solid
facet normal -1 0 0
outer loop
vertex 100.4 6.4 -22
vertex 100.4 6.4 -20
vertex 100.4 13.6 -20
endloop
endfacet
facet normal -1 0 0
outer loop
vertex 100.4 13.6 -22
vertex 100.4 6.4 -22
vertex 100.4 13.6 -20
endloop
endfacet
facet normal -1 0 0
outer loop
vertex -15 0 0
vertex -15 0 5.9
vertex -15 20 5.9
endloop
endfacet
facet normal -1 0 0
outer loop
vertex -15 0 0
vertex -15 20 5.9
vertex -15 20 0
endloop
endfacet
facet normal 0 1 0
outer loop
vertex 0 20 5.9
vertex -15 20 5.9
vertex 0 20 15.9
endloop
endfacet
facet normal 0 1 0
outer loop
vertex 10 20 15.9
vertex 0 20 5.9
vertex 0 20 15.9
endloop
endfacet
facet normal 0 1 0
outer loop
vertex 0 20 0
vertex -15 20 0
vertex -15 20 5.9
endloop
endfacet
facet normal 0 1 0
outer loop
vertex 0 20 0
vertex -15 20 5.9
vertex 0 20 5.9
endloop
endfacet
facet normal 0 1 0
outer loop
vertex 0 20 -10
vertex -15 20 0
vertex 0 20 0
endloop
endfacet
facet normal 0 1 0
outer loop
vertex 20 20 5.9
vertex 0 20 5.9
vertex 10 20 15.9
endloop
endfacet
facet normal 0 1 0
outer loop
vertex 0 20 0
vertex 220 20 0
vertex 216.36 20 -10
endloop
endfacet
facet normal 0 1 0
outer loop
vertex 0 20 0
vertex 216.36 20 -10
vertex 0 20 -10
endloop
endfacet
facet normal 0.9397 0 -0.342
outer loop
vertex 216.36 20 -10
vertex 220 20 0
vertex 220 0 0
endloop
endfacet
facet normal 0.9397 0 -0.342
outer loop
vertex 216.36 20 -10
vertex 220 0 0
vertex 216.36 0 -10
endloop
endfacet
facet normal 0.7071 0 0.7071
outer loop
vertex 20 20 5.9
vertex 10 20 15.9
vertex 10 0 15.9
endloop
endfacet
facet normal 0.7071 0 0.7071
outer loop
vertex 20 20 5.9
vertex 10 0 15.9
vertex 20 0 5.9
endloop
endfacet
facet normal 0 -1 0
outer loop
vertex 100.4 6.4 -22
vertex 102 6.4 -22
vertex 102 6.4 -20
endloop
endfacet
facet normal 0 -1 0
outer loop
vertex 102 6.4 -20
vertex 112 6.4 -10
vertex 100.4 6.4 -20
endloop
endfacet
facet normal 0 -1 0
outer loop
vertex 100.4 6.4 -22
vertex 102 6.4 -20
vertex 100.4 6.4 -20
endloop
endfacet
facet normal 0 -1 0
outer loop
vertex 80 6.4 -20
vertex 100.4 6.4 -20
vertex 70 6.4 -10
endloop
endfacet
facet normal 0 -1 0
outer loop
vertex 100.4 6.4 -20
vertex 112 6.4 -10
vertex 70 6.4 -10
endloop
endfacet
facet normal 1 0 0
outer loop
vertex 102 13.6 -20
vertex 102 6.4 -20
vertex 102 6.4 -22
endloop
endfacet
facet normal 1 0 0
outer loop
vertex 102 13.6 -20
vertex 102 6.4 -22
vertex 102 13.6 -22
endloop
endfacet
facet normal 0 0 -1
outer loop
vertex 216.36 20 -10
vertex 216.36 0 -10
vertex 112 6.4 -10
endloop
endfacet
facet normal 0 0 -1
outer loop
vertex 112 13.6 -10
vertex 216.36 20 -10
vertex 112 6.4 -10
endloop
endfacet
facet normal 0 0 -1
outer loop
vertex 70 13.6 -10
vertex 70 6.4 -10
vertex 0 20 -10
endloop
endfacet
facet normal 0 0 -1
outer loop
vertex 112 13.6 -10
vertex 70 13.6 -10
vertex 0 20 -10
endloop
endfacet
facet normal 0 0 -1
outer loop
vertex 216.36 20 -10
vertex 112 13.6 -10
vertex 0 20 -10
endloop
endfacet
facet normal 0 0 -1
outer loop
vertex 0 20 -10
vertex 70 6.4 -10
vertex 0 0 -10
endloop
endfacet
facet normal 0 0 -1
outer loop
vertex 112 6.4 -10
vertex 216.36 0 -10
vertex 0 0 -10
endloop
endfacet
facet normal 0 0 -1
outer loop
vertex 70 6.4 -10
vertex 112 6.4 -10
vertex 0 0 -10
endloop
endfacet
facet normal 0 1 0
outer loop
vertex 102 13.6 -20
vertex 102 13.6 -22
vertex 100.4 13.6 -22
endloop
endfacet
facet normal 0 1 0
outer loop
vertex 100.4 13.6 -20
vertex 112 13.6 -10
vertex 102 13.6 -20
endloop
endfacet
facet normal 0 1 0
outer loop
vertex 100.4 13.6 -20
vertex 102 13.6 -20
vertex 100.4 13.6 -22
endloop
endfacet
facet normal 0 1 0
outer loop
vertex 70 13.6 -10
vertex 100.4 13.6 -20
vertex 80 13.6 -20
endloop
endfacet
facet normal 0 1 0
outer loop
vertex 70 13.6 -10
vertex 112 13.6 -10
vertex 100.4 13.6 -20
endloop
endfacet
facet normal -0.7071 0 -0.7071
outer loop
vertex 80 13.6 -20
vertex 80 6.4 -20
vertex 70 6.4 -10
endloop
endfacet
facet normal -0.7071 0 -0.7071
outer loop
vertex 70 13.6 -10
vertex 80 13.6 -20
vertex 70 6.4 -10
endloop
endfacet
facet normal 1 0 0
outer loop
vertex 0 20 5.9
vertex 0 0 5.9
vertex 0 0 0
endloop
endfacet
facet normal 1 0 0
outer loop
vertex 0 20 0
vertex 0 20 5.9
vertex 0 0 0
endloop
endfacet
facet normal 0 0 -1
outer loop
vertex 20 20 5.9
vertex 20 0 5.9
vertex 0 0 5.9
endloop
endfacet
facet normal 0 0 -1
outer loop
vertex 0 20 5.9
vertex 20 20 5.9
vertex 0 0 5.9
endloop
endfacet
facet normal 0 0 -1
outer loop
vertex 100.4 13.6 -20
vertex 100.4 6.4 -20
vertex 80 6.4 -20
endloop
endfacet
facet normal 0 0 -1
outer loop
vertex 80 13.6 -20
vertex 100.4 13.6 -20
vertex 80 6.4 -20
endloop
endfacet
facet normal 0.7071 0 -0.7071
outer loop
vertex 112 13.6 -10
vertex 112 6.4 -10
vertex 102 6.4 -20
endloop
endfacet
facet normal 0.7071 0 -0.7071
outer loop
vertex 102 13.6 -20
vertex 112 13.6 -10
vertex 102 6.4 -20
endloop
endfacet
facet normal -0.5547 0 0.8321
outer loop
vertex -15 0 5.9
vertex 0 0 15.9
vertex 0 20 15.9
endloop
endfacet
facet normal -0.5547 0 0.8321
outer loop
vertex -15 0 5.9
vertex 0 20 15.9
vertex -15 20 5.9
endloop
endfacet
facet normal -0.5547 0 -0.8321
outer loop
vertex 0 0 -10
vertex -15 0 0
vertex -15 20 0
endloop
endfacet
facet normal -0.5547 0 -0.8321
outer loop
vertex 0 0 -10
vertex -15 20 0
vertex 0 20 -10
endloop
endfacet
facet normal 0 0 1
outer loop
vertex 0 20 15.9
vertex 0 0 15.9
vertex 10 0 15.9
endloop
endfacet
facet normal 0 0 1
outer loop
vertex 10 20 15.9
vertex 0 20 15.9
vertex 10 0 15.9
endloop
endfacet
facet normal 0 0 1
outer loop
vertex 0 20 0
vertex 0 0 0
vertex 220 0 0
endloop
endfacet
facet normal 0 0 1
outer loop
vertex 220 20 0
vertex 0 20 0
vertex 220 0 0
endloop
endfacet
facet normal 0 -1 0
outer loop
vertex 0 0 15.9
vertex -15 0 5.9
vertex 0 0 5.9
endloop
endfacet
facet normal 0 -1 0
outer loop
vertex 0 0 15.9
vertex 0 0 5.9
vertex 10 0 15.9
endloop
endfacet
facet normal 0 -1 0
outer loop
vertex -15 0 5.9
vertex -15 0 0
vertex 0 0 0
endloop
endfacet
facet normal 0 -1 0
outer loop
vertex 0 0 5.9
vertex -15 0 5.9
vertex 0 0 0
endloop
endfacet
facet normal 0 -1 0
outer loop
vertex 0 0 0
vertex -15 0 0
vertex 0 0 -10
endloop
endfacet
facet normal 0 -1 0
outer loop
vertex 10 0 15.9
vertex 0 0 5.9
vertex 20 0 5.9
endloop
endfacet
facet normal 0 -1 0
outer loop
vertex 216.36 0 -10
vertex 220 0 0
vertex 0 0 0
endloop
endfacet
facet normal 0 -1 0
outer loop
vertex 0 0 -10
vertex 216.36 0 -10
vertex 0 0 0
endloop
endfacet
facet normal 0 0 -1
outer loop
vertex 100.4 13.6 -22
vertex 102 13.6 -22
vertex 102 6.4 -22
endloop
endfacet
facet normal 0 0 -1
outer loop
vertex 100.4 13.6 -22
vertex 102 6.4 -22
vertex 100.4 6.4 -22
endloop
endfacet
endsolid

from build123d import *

# Parameters (mm, degrees)
SKIZZE1_W                       = 15
SKIZZE1_H                       = 5.9
AUFSATZ_LINEAR_AUSTRAGEN1_DEPTH = 20
SCHNITT_LINEAR_AUSTRAGEN1_DEPTH = 6.4
SCHNITT_LINEAR_AUSTRAGEN2_DEPTH = 6.4
SKIZZE4_W                       = 1.6
SKIZZE4_H                       = 7.2
AUFSATZ_LINEAR_AUSTRAGEN2_DEPTH = 2


with BuildPart() as part:
    # Skizze1 → Aufsatz-Linear austragen1 (new body)
    with BuildSketch(Plane(origin=(0, 0, 0), x_dir=(1, 0, 0), z_dir=(0, 1, 0))):
        Polygon((20, -5.9), (0, -5.9), (0, -15.9), (10, -15.9), align=None)
        Polygon((0, -5.9), (0, -15.9), (-15, -5.9), align=None)
        with Locations((-7.5, -2.95)):
            Rectangle(SKIZZE1_W, SKIZZE1_H)
        Polygon((0, 10), (0, 0), (-15, 0), align=None)
        Polygon((0, 10), (0, 0), (80, 0), (80, 10), (70, 10), align=None)
        Polygon((80, 10), (80, 0), (220, 0), (216.360297657, 10), (112, 10), align=None)
        Polygon((80, 20), (80, 10), (112, 10), (102, 20), align=None)
        Polygon((70, 10), (80, 10), (80, 20), align=None)
    extrude(amount=AUFSATZ_LINEAR_AUSTRAGEN1_DEPTH)

    # Skizze2 → Schnitt-Linear austragen1 (cut)
    with BuildSketch(Plane(origin=(0, 20, 0), x_dir=(1, 0, 0), z_dir=(0, 1, 0))):
        Polygon((70, 10), (112, 10), (102, 20), (80, 20), align=None)
    extrude(amount=-SCHNITT_LINEAR_AUSTRAGEN1_DEPTH, mode=Mode.SUBTRACT)

    # Skizze3 → Schnitt-Linear austragen2 (cut)
    with BuildSketch(Plane.XZ):
        Polygon((70, -10), (112, -10), (102, -20), (80, -20), align=None)
    extrude(amount=-SCHNITT_LINEAR_AUSTRAGEN2_DEPTH, mode=Mode.SUBTRACT)

    # Skizze4 → Aufsatz-Linear austragen2 (add)
    with BuildSketch(Plane(origin=(0, 0, -20), x_dir=(-1, 0, 0), z_dir=(0, 0, -1))):
        with Locations((-101.2, 10)):
            Rectangle(SKIZZE4_W, SKIZZE4_H)
    extrude(amount=AUFSATZ_LINEAR_AUSTRAGEN2_DEPTH)


solid = part.part
